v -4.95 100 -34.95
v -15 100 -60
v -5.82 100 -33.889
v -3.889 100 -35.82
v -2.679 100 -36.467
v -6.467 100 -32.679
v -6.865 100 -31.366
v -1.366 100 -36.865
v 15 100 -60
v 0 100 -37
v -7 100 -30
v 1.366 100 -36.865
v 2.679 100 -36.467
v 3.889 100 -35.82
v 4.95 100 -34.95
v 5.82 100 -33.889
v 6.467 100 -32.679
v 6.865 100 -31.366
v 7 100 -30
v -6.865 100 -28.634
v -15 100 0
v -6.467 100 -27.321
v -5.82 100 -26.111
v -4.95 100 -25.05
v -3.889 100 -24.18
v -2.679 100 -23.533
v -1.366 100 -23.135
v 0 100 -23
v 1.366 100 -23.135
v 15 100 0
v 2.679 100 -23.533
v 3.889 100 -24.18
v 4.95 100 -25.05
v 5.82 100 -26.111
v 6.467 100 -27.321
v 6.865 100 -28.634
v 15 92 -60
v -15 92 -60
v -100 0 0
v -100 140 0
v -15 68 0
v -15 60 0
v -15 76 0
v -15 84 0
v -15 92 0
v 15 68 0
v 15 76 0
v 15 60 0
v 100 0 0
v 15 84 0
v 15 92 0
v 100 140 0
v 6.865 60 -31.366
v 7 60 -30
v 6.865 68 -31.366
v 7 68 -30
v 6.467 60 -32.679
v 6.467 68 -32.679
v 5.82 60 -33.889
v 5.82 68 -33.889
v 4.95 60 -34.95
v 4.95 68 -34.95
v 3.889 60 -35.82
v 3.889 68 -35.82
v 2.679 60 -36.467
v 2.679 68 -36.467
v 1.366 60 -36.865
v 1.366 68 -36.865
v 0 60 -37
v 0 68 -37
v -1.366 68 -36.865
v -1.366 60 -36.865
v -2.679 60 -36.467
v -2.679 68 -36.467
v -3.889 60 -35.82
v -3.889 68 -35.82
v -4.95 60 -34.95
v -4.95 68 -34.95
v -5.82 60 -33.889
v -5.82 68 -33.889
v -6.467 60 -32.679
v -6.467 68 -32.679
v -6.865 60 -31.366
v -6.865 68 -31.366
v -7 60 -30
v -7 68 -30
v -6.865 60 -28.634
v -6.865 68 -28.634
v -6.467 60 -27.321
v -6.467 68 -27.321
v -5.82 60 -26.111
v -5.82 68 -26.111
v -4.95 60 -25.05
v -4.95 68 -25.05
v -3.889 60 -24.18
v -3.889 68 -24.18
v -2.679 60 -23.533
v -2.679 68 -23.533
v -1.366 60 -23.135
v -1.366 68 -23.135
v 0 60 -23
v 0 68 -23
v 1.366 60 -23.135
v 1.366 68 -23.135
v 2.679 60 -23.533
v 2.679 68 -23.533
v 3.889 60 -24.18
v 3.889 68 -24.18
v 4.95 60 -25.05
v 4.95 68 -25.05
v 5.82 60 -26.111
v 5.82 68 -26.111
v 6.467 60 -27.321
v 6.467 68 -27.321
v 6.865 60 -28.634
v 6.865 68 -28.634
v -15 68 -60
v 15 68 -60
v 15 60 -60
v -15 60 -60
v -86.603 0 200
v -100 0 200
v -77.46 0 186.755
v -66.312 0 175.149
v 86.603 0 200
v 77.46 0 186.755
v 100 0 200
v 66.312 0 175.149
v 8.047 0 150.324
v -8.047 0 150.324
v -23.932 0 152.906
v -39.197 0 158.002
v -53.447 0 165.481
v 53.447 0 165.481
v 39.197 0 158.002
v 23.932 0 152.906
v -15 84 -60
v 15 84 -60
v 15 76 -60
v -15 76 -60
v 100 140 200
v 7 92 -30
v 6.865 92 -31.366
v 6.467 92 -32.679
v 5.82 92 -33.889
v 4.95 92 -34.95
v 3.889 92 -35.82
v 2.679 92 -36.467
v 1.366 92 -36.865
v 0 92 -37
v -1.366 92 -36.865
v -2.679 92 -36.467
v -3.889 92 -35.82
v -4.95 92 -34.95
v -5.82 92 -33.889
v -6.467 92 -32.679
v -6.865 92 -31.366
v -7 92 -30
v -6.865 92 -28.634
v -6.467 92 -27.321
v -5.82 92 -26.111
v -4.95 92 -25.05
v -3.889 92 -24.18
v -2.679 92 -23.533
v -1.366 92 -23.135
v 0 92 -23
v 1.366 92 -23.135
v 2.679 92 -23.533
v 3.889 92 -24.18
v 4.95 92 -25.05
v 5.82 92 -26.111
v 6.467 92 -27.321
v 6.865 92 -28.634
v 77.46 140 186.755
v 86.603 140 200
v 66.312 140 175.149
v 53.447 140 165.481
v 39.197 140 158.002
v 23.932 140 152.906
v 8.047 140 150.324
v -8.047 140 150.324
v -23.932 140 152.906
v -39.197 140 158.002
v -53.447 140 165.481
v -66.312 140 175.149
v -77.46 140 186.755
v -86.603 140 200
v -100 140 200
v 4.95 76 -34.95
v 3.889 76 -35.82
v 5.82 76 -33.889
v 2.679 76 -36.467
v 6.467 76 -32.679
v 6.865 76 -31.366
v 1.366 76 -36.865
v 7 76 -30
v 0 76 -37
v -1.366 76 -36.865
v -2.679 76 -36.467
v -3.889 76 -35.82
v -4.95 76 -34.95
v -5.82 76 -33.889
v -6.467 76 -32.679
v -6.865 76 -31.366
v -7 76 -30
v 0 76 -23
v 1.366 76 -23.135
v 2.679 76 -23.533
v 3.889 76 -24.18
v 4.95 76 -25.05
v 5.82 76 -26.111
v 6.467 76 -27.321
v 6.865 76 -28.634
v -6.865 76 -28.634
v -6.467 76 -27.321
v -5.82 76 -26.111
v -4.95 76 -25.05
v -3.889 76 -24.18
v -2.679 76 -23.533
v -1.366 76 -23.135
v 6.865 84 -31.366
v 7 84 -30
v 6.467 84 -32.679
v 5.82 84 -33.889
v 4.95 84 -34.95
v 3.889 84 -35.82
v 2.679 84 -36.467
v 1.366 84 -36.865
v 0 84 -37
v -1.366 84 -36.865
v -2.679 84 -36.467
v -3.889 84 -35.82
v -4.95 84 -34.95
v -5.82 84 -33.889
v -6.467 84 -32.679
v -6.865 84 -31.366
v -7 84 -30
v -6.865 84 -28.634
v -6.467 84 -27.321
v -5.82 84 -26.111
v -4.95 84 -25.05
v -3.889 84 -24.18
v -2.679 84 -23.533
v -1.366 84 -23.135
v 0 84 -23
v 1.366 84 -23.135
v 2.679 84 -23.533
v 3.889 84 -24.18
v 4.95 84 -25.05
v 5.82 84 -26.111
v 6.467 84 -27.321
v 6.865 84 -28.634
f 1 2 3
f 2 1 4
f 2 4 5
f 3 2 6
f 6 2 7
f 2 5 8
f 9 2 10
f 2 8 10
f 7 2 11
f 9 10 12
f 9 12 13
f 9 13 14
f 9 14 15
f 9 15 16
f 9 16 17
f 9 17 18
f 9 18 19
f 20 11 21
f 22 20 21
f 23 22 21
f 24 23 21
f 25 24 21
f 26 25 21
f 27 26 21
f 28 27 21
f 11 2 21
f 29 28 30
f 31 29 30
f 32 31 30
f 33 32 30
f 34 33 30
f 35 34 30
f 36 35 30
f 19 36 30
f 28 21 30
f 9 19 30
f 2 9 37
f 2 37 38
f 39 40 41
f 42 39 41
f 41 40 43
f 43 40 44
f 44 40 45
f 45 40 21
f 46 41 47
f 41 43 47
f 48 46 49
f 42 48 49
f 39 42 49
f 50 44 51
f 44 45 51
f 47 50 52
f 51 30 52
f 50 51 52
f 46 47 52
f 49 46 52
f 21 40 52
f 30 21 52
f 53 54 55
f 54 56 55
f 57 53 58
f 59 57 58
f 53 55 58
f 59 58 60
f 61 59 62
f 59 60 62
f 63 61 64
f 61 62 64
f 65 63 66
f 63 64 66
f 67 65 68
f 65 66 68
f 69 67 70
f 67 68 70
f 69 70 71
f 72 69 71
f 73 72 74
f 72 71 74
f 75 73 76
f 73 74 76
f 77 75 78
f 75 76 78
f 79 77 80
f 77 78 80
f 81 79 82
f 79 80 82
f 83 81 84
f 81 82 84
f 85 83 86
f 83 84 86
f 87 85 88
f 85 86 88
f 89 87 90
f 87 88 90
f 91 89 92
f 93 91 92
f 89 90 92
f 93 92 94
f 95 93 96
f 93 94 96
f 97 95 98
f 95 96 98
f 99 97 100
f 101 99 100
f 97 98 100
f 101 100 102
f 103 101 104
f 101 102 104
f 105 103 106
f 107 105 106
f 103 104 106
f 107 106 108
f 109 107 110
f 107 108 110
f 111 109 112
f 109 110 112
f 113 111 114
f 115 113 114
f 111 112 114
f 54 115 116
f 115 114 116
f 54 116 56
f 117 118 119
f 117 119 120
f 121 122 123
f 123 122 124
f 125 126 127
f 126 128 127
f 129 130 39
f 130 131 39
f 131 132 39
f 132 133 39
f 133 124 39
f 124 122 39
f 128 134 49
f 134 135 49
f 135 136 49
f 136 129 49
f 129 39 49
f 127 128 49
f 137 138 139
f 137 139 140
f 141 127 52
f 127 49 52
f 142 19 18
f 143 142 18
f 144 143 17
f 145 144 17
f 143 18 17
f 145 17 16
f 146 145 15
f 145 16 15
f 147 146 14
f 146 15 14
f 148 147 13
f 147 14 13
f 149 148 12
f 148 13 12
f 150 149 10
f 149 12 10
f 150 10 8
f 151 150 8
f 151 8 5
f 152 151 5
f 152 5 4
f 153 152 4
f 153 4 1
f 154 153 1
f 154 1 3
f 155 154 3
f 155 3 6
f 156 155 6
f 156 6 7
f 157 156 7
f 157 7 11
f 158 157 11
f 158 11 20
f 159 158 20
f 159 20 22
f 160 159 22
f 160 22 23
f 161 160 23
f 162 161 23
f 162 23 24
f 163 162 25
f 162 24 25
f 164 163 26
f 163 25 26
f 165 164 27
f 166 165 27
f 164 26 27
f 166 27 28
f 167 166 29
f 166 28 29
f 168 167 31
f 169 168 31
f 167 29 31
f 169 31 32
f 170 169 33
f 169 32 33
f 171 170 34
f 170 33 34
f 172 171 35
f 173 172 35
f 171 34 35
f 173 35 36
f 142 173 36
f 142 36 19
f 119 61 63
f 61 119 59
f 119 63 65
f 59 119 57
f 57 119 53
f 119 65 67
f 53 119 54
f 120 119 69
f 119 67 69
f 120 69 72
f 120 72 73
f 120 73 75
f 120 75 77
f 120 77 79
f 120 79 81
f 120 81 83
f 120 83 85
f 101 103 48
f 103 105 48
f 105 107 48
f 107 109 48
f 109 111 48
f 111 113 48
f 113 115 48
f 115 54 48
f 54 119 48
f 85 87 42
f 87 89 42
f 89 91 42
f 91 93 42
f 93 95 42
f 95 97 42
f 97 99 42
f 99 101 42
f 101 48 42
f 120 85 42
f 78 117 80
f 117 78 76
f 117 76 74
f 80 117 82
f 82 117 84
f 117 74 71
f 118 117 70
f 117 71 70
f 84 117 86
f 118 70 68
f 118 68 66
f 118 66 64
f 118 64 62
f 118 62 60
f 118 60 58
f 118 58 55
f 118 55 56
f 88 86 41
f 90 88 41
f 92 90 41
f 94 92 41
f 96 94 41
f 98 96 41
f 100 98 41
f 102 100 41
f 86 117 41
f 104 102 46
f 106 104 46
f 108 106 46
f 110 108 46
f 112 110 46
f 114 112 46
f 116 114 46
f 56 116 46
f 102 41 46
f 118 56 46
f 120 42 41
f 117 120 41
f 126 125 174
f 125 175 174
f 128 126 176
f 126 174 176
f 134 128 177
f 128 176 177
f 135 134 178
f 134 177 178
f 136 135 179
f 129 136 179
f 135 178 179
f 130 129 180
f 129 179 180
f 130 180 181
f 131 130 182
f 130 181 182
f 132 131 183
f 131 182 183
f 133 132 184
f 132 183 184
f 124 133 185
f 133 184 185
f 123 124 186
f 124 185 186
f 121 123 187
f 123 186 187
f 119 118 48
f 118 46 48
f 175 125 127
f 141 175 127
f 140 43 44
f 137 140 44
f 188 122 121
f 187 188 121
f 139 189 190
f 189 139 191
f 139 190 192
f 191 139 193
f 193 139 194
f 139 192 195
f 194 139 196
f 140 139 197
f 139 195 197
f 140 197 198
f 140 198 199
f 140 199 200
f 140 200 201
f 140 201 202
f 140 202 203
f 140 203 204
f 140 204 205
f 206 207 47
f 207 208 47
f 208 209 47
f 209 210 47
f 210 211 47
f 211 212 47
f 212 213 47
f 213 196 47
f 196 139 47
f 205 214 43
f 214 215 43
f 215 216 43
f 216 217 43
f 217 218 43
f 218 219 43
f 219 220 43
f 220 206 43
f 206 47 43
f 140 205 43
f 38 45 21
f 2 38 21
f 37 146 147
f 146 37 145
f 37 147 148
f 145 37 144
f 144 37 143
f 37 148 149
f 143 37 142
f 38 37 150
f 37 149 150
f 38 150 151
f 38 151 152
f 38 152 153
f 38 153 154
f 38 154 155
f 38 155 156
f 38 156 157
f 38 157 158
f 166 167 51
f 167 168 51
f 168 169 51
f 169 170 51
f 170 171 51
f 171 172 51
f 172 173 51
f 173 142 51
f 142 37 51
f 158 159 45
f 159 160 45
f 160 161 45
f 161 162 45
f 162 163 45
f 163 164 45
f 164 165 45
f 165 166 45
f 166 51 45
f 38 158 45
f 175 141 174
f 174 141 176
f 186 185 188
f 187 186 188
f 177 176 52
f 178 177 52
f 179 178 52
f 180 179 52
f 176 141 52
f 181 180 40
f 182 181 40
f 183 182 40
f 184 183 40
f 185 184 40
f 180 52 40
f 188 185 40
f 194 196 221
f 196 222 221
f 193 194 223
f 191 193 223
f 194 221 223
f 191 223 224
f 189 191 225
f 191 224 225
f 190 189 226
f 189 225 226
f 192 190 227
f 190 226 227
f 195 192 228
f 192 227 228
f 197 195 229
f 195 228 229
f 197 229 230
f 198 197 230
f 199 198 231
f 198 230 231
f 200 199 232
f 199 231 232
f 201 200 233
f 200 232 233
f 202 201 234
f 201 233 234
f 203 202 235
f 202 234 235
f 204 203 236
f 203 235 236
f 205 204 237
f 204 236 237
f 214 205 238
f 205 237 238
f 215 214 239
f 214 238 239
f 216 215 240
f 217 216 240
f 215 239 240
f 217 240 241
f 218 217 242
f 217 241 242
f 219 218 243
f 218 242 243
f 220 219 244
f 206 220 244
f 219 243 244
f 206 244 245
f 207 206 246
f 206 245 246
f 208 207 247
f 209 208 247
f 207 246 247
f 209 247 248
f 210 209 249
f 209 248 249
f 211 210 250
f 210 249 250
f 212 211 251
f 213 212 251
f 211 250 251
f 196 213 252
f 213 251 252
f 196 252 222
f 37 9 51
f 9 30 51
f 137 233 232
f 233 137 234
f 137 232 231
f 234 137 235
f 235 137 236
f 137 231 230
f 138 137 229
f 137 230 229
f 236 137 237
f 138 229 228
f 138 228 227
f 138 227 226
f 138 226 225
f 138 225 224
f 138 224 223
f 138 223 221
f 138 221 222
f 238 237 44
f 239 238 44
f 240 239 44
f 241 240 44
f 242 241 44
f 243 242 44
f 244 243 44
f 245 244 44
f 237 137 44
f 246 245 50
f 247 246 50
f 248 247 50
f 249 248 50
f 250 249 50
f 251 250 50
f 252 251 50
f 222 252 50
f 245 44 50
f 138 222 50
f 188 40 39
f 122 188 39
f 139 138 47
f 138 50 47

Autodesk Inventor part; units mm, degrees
ref_plane "YZ Plane" through (0, 0, 0) normal (1, 0, 0) x (0, 1, 0)
ref_plane "XZ Plane" through (0, 0, 0) normal (0, 1, 0) x (-1, 0, 0)
ref_plane "XY Plane" through (0, 0, 0) normal (0, 0, 1) x (1, 0, 0)
sketch "Skizze1" plane through (0, 0, 0) normal (0, 0, 1) x (1, 0, 0)
  line L0 (-100, 0) -> (100, 0)
  line L1 (100, 0) -> (100, 140)
  line L2 (100, 140) -> (-100, 140)
  line L3 (-100, 140) -> (-100, 0)
  point P0 (0, 0)
  dimension "d0" = 200
  dimension "d1" = 140
extrude "Extrusion1" add sketch "Skizze1" along normal blind 200
sketch "Skizze2" plane through (-100, 140, 0) normal (0, 1, 0) x (1, 0, 0)
  circle A0 centre (100, -250) radius 100
  point P0 (100, 0)
  dimension "d4" = 200
extrude "Extrusion2" cut sketch "Skizze2" against normal blind 140
sketch "Skizze3" plane through (0, 0, 0) normal (0, 0, -1) x (-1, 0, 0)
  point P0 (0, 0)
sketch "Skizze4" plane through (0, 0, 0) normal (0, 0, -1) x (-1, 0, 0)
  line L0 (15, 68) -> (-15, 68)
  line L1 (-15, 68) -> (-15, 60)
  line L2 (-15, 60) -> (15, 60)
  line L3 (15, 60) -> (15, 68)
  line L4 (-15, 76) -> (15, 76)
  line L5 (15, 76) -> (15, 84)
  line L6 (15, 84) -> (-15, 84)
  line L7 (-15, 84) -> (-15, 76)
  line L8 (-15, 92) -> (15, 92)
  line L9 (15, 92) -> (15, 100)
  line L10 (15, 100) -> (-15, 100)
  line L11 (-15, 100) -> (-15, 92)
  point P0 (0, 0)
  dimension "d7" = 30
  dimension "d8" = 8
  dimension "d9" = 30
  dimension "d10" = 8
  dimension "d11" = 8
extrude "Extrusion3" add sketch "Skizze4" along normal blind 60
sketch "Skizze5" plane through (-15, 100, 0) normal (0, 1, 0) x (1, 0, 0)
  circle A0 centre (15, 30) radius 7
  line L0 (0, 60) -> (30, 60) projected
  arc A1 (30, 60) -> (0, 60) centre (15, 60) ccw
  point P0 (15, 0)
  dimension "d14" = 14
  dimension "d15" = 15
extrude "Extrusion4" cut sketch "Skizze5" against normal blind 40 contours A0
properties part number "Auswurf_Rampe"
